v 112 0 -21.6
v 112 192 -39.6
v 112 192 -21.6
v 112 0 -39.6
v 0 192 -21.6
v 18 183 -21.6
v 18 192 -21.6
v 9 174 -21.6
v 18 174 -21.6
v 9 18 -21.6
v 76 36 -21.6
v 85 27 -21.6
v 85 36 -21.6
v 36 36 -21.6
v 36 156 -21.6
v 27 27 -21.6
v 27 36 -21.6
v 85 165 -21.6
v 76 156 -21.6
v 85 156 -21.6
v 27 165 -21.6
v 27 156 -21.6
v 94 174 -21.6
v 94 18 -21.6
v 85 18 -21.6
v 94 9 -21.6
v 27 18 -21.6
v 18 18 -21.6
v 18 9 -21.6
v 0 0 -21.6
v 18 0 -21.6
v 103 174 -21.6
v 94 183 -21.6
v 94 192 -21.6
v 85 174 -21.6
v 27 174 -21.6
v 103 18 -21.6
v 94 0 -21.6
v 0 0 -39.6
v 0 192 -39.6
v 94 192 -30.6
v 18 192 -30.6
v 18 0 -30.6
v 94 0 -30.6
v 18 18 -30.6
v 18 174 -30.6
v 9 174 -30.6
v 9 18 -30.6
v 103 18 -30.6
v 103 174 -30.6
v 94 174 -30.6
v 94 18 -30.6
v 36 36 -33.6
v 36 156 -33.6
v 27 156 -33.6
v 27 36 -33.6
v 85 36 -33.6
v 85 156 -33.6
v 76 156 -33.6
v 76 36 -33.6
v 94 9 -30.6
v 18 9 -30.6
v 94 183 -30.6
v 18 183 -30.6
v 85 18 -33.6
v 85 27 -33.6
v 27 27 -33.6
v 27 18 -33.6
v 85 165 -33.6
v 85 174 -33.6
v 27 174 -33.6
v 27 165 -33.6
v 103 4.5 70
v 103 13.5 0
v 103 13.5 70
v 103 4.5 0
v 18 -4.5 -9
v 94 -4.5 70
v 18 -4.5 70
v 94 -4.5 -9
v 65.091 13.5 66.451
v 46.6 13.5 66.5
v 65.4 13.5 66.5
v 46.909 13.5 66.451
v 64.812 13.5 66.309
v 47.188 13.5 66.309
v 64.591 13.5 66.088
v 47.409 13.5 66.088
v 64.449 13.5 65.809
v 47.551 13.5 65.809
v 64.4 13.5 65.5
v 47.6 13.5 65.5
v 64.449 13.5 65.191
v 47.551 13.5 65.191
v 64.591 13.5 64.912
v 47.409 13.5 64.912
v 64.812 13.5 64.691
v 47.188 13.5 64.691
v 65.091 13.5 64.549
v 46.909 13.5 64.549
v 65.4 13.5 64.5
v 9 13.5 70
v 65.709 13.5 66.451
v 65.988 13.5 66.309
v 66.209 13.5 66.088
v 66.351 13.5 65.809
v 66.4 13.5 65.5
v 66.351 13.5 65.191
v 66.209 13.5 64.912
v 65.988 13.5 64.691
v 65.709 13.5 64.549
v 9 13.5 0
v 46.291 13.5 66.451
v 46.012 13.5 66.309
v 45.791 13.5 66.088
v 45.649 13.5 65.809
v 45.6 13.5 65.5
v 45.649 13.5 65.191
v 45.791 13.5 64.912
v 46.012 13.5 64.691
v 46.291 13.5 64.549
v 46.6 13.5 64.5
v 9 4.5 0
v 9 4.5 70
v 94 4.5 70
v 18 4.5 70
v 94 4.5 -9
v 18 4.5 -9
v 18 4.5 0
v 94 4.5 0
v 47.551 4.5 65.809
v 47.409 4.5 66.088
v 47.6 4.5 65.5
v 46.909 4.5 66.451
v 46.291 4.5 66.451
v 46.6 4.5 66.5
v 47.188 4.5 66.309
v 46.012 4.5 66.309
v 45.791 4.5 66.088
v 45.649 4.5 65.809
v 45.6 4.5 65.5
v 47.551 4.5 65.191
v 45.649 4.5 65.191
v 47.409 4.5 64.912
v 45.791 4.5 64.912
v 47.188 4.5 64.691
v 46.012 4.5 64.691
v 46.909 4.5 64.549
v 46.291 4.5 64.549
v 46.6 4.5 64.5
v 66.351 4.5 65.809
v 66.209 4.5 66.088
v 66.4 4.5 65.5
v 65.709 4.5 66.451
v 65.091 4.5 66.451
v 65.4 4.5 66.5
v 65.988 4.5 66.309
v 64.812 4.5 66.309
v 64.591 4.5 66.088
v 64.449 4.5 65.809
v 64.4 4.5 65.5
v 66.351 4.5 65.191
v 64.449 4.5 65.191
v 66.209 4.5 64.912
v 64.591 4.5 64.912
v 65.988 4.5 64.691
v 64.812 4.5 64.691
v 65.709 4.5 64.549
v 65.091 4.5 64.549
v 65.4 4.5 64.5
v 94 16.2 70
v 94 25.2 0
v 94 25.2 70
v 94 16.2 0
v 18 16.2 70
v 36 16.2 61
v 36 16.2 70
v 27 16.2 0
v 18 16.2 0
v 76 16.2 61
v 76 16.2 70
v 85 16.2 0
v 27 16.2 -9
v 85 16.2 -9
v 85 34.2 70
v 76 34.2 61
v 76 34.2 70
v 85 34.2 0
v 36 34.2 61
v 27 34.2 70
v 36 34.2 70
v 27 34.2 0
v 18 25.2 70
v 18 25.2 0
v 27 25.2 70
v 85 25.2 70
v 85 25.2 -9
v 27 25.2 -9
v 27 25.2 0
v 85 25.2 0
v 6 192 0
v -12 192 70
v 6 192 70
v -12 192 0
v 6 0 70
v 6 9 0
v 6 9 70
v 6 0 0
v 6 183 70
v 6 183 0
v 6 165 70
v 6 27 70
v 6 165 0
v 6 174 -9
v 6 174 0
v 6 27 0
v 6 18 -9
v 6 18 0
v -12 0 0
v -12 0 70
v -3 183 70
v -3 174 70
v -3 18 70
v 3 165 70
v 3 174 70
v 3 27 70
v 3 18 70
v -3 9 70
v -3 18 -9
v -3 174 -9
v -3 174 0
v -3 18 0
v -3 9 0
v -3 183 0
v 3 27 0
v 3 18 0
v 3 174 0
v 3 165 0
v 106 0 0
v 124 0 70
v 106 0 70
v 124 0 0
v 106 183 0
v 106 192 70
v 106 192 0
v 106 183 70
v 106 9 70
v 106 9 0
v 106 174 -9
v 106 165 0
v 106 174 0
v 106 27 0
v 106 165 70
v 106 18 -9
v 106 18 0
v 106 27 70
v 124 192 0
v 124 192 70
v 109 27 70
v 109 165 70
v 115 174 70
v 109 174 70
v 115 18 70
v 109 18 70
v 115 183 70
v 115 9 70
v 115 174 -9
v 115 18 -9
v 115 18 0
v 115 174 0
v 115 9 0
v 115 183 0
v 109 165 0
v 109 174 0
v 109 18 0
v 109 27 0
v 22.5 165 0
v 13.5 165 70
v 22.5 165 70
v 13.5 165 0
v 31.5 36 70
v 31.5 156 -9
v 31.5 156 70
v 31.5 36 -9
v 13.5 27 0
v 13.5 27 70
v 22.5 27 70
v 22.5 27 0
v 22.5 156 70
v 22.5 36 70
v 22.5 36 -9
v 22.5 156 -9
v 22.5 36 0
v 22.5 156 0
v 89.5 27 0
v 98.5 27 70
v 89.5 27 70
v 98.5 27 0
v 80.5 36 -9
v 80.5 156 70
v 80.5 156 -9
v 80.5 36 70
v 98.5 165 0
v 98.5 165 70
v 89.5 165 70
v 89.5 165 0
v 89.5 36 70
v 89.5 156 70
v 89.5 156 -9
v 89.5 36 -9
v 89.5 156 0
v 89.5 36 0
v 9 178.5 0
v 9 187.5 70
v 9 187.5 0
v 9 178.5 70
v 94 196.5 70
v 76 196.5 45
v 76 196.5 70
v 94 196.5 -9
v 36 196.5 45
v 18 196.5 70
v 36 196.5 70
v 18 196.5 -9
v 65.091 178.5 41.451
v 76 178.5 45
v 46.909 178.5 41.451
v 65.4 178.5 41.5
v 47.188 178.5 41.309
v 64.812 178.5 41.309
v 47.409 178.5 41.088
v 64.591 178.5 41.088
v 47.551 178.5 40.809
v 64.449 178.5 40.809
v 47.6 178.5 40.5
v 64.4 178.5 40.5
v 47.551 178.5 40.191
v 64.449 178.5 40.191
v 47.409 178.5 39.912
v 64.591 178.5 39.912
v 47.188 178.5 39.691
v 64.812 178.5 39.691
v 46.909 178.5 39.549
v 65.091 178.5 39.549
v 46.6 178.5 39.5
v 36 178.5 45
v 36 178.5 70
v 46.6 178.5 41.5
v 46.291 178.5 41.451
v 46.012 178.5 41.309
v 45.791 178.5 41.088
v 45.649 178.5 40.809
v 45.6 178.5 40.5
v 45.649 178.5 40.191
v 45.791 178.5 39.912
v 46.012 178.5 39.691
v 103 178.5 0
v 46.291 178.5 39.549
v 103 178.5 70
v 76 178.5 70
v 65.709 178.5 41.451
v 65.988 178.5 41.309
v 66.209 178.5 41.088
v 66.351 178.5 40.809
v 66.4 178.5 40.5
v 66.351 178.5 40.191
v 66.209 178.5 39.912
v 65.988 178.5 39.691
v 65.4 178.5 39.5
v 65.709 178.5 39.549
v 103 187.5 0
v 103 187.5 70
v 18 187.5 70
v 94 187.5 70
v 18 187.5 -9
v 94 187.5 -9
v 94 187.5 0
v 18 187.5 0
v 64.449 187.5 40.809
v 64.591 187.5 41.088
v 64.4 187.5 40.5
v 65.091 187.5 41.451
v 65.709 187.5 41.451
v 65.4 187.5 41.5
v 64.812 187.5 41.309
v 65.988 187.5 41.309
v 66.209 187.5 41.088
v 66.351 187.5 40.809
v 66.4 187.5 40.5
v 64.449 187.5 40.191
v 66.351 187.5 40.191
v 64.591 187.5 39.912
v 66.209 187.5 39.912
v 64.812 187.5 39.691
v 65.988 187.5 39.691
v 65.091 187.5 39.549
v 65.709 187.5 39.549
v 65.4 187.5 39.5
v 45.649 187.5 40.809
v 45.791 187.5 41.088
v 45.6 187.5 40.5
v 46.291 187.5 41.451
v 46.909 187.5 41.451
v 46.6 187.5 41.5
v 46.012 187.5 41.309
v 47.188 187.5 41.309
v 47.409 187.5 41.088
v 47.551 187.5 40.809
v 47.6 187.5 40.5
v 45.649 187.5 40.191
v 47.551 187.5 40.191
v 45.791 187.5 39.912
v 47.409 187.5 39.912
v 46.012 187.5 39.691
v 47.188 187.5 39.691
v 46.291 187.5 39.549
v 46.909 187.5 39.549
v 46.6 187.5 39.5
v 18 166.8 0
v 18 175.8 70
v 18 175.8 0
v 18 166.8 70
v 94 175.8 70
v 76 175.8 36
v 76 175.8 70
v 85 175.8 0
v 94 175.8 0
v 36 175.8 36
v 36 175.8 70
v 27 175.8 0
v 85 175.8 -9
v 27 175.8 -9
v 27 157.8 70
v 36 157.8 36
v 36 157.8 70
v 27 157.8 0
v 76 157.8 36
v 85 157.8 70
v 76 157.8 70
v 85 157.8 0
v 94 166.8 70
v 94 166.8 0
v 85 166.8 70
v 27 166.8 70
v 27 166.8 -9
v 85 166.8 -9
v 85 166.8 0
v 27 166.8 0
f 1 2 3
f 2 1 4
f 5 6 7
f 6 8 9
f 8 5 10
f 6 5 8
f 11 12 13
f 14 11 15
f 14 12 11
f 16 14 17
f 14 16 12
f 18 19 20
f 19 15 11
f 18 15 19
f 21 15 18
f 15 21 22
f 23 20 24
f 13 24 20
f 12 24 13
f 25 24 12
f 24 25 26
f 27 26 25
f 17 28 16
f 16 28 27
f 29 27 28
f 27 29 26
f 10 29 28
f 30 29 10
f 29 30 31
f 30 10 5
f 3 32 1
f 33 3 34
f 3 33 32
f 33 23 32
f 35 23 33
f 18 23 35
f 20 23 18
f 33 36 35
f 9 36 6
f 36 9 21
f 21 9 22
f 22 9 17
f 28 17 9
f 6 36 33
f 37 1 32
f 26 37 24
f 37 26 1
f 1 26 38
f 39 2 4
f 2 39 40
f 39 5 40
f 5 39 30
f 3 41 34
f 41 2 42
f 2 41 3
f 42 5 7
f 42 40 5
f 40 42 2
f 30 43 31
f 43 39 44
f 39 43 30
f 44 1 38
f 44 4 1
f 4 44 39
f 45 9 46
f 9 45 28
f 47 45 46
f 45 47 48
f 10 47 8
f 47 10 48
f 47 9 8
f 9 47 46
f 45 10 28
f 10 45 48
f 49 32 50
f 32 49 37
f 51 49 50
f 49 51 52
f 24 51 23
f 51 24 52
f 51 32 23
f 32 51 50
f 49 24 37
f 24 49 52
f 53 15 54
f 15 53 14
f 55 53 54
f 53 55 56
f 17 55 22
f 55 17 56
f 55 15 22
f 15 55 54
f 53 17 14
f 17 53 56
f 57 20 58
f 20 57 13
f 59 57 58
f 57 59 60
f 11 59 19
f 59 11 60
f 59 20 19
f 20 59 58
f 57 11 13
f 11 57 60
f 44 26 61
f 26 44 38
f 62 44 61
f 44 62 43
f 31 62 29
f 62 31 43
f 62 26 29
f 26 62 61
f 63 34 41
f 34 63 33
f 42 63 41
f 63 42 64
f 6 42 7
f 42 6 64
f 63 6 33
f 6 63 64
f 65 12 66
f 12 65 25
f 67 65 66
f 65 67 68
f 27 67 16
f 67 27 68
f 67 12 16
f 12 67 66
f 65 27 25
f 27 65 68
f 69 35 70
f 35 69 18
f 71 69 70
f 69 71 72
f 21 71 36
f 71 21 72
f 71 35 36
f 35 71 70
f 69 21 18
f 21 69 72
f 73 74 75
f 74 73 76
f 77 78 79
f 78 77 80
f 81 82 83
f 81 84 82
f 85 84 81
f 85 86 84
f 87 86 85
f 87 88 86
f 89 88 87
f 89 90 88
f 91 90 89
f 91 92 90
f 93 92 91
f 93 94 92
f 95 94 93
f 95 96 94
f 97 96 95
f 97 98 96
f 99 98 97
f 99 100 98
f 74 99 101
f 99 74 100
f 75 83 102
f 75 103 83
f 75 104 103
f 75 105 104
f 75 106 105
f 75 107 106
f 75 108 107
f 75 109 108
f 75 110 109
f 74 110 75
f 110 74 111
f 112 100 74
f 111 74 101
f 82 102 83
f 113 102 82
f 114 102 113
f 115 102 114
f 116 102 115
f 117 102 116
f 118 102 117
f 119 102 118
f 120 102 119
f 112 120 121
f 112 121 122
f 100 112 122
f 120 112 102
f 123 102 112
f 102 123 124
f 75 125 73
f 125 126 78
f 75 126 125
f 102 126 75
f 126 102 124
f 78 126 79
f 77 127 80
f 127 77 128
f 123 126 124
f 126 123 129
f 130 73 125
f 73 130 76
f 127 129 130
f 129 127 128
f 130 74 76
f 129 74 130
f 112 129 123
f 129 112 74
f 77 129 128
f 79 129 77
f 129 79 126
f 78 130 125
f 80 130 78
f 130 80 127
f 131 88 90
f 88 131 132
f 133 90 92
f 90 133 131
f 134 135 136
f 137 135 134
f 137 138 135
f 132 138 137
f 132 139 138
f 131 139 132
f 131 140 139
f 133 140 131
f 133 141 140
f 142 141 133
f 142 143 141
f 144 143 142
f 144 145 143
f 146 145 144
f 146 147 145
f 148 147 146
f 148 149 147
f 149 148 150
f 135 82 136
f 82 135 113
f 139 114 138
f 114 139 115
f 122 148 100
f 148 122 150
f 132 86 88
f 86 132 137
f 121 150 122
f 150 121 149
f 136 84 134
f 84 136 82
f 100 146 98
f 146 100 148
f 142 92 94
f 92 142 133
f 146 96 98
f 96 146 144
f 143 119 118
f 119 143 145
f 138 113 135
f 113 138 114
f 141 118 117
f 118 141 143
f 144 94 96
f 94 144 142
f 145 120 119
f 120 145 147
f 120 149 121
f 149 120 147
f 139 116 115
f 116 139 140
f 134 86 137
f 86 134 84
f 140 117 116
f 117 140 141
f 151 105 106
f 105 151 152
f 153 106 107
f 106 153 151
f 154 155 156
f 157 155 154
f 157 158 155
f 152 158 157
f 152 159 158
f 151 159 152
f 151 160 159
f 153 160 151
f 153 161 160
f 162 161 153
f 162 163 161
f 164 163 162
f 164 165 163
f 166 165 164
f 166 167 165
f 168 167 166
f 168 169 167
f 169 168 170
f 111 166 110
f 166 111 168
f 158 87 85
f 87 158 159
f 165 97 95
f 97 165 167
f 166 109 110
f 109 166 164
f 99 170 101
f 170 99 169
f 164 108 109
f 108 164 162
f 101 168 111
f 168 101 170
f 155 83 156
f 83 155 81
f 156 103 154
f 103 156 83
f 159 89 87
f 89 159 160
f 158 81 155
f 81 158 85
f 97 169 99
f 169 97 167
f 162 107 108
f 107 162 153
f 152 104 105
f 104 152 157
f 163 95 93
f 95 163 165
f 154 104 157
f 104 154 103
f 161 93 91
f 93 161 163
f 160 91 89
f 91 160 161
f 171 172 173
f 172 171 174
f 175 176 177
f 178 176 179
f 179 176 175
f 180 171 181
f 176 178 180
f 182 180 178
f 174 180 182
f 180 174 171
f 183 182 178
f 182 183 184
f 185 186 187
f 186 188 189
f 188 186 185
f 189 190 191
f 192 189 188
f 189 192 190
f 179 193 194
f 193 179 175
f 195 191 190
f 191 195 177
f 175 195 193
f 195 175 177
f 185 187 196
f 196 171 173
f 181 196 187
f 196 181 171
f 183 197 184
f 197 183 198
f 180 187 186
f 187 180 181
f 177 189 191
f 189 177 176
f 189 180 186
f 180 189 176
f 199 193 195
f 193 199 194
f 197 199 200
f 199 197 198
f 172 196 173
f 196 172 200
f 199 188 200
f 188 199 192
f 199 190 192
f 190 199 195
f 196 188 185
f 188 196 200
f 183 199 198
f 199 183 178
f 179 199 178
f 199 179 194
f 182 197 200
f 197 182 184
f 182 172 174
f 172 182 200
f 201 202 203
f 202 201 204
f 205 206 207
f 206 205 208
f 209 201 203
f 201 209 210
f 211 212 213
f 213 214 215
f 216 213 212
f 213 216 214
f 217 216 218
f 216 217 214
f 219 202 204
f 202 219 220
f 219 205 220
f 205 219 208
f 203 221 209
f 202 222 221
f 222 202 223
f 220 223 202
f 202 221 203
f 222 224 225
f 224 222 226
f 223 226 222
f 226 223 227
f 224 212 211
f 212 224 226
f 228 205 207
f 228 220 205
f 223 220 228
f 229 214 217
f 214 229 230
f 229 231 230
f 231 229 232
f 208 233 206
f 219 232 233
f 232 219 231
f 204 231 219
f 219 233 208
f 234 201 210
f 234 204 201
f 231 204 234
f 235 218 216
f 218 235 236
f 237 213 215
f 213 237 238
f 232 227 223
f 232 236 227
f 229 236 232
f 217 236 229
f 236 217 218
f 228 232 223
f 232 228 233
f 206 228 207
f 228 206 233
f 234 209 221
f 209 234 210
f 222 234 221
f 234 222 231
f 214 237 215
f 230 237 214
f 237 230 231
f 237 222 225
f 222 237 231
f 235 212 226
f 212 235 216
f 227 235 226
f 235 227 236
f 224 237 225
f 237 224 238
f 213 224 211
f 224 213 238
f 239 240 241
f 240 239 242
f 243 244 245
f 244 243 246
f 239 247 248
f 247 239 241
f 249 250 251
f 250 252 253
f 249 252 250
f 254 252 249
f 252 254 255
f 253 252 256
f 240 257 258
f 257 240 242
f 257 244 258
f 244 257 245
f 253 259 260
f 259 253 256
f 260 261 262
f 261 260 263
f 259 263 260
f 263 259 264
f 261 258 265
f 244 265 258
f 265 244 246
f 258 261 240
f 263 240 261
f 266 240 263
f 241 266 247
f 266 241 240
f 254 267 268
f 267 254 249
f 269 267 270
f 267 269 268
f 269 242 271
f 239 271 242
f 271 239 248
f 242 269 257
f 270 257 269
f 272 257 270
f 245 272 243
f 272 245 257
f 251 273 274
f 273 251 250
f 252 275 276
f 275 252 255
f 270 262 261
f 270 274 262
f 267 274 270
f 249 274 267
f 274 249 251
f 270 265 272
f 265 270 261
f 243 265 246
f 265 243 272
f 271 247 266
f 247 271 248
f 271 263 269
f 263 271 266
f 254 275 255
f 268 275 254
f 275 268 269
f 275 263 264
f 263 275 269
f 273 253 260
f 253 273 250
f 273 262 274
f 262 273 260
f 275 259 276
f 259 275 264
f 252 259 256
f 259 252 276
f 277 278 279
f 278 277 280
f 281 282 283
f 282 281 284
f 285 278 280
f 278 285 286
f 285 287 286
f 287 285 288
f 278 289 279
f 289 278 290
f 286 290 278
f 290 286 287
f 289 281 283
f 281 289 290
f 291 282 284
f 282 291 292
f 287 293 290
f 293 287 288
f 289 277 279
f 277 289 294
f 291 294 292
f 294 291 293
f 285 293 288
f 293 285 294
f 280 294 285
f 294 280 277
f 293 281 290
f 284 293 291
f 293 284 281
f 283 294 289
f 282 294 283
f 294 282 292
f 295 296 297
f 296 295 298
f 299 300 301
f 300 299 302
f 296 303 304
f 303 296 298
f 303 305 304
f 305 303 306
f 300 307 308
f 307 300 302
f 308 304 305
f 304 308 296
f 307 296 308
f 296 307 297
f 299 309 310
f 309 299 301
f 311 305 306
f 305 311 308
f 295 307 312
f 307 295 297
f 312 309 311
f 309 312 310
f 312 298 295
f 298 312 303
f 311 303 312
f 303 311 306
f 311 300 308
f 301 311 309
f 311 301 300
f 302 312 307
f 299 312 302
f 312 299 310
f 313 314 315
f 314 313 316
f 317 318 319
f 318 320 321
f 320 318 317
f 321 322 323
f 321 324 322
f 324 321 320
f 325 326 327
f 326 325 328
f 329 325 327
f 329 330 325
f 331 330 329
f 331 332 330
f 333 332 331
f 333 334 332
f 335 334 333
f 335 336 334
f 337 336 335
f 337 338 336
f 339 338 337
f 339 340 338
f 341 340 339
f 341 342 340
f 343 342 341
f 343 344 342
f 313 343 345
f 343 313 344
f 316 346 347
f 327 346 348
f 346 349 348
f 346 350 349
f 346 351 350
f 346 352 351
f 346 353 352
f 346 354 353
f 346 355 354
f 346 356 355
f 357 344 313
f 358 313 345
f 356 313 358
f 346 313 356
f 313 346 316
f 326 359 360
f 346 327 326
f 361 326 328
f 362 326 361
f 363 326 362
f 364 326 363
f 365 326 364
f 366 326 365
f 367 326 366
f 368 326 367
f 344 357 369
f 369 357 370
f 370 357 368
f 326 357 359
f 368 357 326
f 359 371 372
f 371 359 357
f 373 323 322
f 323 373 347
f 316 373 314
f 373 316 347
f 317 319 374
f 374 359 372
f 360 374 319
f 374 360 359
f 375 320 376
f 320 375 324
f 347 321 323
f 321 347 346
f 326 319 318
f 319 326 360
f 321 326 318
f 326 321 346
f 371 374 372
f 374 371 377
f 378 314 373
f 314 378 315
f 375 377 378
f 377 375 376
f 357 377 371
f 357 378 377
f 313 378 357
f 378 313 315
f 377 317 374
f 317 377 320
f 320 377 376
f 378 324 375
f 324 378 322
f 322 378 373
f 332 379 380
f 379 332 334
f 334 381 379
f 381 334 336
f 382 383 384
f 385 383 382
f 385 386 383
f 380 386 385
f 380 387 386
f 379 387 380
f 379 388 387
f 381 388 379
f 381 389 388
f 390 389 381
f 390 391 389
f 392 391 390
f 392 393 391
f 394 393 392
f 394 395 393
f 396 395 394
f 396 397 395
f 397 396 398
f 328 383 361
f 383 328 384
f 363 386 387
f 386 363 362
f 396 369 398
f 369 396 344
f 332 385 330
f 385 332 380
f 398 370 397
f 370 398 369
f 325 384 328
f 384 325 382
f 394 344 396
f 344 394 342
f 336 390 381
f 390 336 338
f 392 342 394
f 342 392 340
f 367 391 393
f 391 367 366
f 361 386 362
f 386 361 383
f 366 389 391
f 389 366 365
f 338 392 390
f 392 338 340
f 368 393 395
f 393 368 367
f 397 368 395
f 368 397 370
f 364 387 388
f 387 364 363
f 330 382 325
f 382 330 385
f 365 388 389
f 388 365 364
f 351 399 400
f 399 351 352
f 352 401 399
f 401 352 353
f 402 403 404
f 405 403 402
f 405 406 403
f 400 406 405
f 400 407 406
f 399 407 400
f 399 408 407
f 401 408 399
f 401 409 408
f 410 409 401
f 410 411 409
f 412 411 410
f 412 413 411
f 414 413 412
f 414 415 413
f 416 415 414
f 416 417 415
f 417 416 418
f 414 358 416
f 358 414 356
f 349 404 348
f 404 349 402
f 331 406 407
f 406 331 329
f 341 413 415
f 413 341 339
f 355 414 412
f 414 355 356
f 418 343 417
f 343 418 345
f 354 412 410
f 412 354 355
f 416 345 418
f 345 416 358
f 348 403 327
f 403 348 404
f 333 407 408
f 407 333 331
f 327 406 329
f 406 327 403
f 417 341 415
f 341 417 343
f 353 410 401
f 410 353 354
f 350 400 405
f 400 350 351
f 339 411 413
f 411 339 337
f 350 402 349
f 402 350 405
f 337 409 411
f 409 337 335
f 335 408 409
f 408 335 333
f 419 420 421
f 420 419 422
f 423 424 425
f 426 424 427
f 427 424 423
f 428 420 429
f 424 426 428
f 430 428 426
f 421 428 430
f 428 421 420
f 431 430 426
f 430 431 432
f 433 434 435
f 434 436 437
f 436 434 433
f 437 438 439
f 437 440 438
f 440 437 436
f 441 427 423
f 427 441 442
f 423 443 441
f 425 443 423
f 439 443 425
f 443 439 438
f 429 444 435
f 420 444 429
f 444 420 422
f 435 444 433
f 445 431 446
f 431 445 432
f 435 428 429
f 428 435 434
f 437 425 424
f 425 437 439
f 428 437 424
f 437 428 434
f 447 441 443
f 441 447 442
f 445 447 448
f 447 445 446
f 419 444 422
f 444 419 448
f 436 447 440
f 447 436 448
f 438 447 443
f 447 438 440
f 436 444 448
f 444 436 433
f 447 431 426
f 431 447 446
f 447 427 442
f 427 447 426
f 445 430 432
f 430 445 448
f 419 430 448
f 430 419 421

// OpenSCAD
// pinetrim 230x18mm
// 110mm plate - 10mm gap - 110mm plate

inner_width = 40;
inner_length = 120;
inner_height = 50;

waterline = 20;
back_flashing_thickness = 5;

// predrill holes diameter
prehole = 2;

groove_depth = 9;
groove_width = 9;
seal_thickness = 3; // 4mm real
sealed_groove_depth = groove_depth + seal_thickness;

panel_thickness = groove_depth * 2;

outer_width = inner_width + panel_thickness * 4;
outer_length = inner_length + panel_thickness * 4;
outer_height = inner_height + groove_depth + waterline;

module plate () {
    difference() {
        // plate
        cube([outer_width, outer_length, panel_thickness]);
        
        // outer sides grooves
        translate([groove_width, panel_thickness, groove_depth])
            cube([groove_width, outer_length - panel_thickness * 2, groove_depth]);
        translate([outer_width - groove_width * 2, panel_thickness, groove_depth])
            cube([groove_width, outer_length - panel_thickness * 2, groove_depth]);
        
        // inner sides grooves
        translate([groove_width * 3, panel_thickness * 2, groove_depth - seal_thickness])
            cube([groove_width, outer_length - panel_thickness * 4, sealed_groove_depth]);
        translate([outer_width - groove_width * 4, panel_thickness * 2, groove_depth - seal_thickness])
            cube([groove_width, outer_length - panel_thickness * 4, sealed_groove_depth]);
        
        // outer ends grooves
        translate([panel_thickness, 0, groove_depth])
            cube([outer_width - panel_thickness * 2, groove_width, groove_depth]);
        translate([panel_thickness, outer_length - groove_width, groove_depth])
            cube([outer_width - panel_thickness * 2, groove_width, groove_depth]);
        
        // inner ends grooves
        translate([groove_width * 3, groove_width * 2, groove_depth - seal_thickness])
            cube([outer_width - groove_width * 6, groove_width, sealed_groove_depth]);
        translate([groove_width * 3, outer_length - groove_width * 3, groove_depth - seal_thickness])
            cube([outer_width - groove_width * 6, groove_width, sealed_groove_depth]);
    }
}

module panel_front_outer () {
    difference() {
        panel_width = outer_width - groove_width * 2;

        // panel
        cube([panel_width, outer_height, panel_thickness]);

        // bottom groove
        cube([panel_width, groove_depth, groove_width]);
        
        // side grooves
        translate([0, 0, groove_width])
            cube([groove_width, outer_height + groove_width, groove_width]);
        translate([panel_width - groove_width, 0, groove_width])
            cube([groove_width, outer_height + groove_width, groove_width]);

        // preholes
        translate([panel_width * 2 / 5, outer_height - groove_depth / 2, 0])
            cylinder(panel_thickness / 2, prehole / 2, prehole / 2, $fn = 20);
        translate([panel_width * 3 / 5, outer_height - groove_depth / 2, 0])
            cylinder(panel_thickness / 2, prehole / 2, prehole / 2, $fn = 20);
    }
}

module panel_front_inner () {
    difference() {
        panel_width = outer_width - panel_thickness * 2;
        panel_inner_height = outer_height - groove_depth;

        // panel
        cube([panel_width, outer_height, panel_thickness]);
        
        // top notch
        translate([panel_thickness, panel_inner_height, 0])
            cube([panel_width - panel_thickness * 2, groove_depth, panel_thickness]);

        // bottom groove
        cube([panel_width, groove_depth, groove_width]);
        
        // side grooves
        translate([0, 0, 0])
            cube([groove_width, outer_height + groove_width, groove_width]);
        translate([panel_width - groove_width, 0, 0])
            cube([groove_width, outer_height + groove_width, groove_width]);
        
        // bottom corners
        translate([0, 0, groove_width])
            cube([groove_width, groove_depth, groove_width]);
        translate([panel_width - groove_width, 0, groove_width])
            cube([groove_width, groove_depth, groove_width]);
    }
}

module panel_back_outer () {
    difference() {
        panel_width = outer_width - groove_width * 2;
        panel_inner_height = outer_height - waterline - back_flashing_thickness;

        // panel
        cube([panel_width, outer_height, panel_thickness]);
        
        // top notch
        translate([panel_thickness + groove_width, panel_inner_height, 0])
            cube([panel_width - panel_thickness * 2 - groove_width * 2, outer_height - panel_inner_height, panel_thickness]);

        // bottom groove
        cube([panel_width, groove_depth, groove_width]);
        
        // side grooves
        translate([0, 0, groove_width])
            cube([groove_width, outer_height + groove_width, groove_width]);
        translate([panel_width - groove_width, 0, groove_width])
            cube([groove_width, outer_height + groove_width, groove_width]);

        // preholes
        translate([panel_width * 2 / 5, panel_inner_height - groove_depth / 2, 0])
            cylinder(panel_thickness / 2, prehole / 2, prehole / 2, $fn = 20);
        translate([panel_width * 3 / 5, panel_inner_height - groove_depth / 2, 0])
            cylinder(panel_thickness / 2, prehole / 2, prehole / 2, $fn = 20);
    }
}

module panel_back_inner () {
    difference() {
        panel_width = outer_width - panel_thickness * 2;
        panel_inner_height = outer_height - waterline - back_flashing_thickness - groove_depth;

        // panel
        cube([panel_width, outer_height, panel_thickness]);
        
        // top notch
        translate([panel_thickness, panel_inner_height, 0])
            cube([panel_width - panel_thickness * 2, outer_height - panel_inner_height, panel_thickness]);

        // bottom groove
        cube([panel_width, groove_depth, groove_width]);
        
        // side grooves
        translate([0, 0, 0])
            cube([groove_width, outer_height + groove_width, groove_width]);
        translate([panel_width - groove_width, 0, 0])
            cube([groove_width, outer_height + groove_width, groove_width]);
        
        // bottom corners
        translate([0, 0, groove_width])
            cube([groove_width, groove_depth, groove_width]);
        translate([panel_width - groove_width, 0, groove_width])
            cube([groove_width, groove_depth, groove_width]);
    }
}

module panel_side_outer () {
    difference() {
        // panel
        cube([outer_length, outer_height, panel_thickness]);
        
        // bottom groove
        cube([outer_length, groove_depth, groove_width]);
        
        // side grooves
        translate([groove_width, groove_depth, groove_width])
            cube([groove_width, outer_height + groove_width, groove_width]);
        translate([outer_length - groove_width * 2, groove_depth, groove_width])
            cube([groove_width, outer_height + groove_width, groove_width]);
        
        // seal grooves
        translate([groove_width * 2, groove_depth, panel_thickness - seal_thickness])
            cube([groove_width, outer_height + groove_width, groove_width]);
        translate([outer_length - groove_width * 3, groove_depth, panel_thickness - seal_thickness])
            cube([groove_width, outer_height + groove_width, groove_width]);
        
        // bottom corners
        translate([0, 0, groove_width])
            cube([panel_thickness, groove_depth, groove_width]);
        translate([outer_length - panel_thickness, 0, groove_width])
            cube([panel_thickness, groove_depth, groove_width]);
    }
}

module panel_side_inner () {
    difference() {
        panel_length = outer_length - panel_thickness * 2 - groove_width * 2;
        // panel
        cube([panel_length, outer_height, panel_thickness]);

        // bottom groove
        cube([panel_length, groove_depth, groove_width]);
        
        // side grooves
        translate([0, 0, groove_width])
            cube([groove_width, outer_height + groove_width, groove_width]);
        translate([panel_length - groove_width, 0, groove_width])
            cube([groove_width, outer_height + groove_width, groove_width]);
    }
}







// in place
if (false) {
    plate();

    rotate([90, 0, 0]) translate([groove_width, 0, -panel_thickness])
        panel_front_outer();

    rotate([90, 0, 0]) translate([groove_width * 2, 0, -panel_thickness * 2])
        panel_front_inner();

    rotate([90, 0, 90]) translate([0, 0, 0])
        panel_side_outer();

    rotate([90, 0, 270]) translate([-outer_length, 0, -outer_width])
        panel_side_outer();

    rotate([90, 0, 90]) translate([panel_thickness + groove_width, 0, panel_thickness])
        panel_side_inner();

    rotate([90, 0, 270]) translate([panel_thickness + groove_width - outer_length, 0, panel_thickness - outer_width])
        panel_side_inner();

    rotate([90, 0, 180]) translate([-outer_width + groove_width, 0, outer_length - panel_thickness])
        panel_back_outer();

    rotate([90, 0, 180]) translate([-outer_width + groove_width * 2, 0, outer_length - panel_thickness * 2])
        panel_back_inner();
}

// exploded
else if (true) {
    translate([0, 0, -panel_thickness * 2.2]) plate();

    rotate([90, 0, 0]) translate([groove_width, -groove_depth, -groove_width * 1.5])
        panel_front_outer();

    rotate([90, 0, 0]) translate([groove_width * 2, -groove_depth, -panel_thickness * 1.9])
        panel_front_inner();

    rotate([90, 0, 90]) translate([0, -groove_depth, -panel_thickness / 1.5])
        panel_side_outer();

    rotate([90, 0, 270]) translate([-outer_length, -groove_depth, -panel_thickness/1.5 - outer_width])
        panel_side_outer();

    rotate([90, 0, 90]) translate([panel_thickness + groove_width, -groove_depth, groove_width * 1.5])
        panel_side_inner();

    rotate([90, 0, 270]) translate([panel_thickness + groove_width - outer_length, -groove_depth, groove_width * 1.5 - outer_width])
        panel_side_inner();

    rotate([90, 0, 180]) translate([-outer_width + groove_width, -groove_depth, outer_length - groove_width * 3/2])
        panel_back_outer();

    rotate([90, 0, 180]) translate([-outer_width + groove_width * 2, -groove_depth, outer_length - panel_thickness * 1.9])
        panel_back_inner();
}
